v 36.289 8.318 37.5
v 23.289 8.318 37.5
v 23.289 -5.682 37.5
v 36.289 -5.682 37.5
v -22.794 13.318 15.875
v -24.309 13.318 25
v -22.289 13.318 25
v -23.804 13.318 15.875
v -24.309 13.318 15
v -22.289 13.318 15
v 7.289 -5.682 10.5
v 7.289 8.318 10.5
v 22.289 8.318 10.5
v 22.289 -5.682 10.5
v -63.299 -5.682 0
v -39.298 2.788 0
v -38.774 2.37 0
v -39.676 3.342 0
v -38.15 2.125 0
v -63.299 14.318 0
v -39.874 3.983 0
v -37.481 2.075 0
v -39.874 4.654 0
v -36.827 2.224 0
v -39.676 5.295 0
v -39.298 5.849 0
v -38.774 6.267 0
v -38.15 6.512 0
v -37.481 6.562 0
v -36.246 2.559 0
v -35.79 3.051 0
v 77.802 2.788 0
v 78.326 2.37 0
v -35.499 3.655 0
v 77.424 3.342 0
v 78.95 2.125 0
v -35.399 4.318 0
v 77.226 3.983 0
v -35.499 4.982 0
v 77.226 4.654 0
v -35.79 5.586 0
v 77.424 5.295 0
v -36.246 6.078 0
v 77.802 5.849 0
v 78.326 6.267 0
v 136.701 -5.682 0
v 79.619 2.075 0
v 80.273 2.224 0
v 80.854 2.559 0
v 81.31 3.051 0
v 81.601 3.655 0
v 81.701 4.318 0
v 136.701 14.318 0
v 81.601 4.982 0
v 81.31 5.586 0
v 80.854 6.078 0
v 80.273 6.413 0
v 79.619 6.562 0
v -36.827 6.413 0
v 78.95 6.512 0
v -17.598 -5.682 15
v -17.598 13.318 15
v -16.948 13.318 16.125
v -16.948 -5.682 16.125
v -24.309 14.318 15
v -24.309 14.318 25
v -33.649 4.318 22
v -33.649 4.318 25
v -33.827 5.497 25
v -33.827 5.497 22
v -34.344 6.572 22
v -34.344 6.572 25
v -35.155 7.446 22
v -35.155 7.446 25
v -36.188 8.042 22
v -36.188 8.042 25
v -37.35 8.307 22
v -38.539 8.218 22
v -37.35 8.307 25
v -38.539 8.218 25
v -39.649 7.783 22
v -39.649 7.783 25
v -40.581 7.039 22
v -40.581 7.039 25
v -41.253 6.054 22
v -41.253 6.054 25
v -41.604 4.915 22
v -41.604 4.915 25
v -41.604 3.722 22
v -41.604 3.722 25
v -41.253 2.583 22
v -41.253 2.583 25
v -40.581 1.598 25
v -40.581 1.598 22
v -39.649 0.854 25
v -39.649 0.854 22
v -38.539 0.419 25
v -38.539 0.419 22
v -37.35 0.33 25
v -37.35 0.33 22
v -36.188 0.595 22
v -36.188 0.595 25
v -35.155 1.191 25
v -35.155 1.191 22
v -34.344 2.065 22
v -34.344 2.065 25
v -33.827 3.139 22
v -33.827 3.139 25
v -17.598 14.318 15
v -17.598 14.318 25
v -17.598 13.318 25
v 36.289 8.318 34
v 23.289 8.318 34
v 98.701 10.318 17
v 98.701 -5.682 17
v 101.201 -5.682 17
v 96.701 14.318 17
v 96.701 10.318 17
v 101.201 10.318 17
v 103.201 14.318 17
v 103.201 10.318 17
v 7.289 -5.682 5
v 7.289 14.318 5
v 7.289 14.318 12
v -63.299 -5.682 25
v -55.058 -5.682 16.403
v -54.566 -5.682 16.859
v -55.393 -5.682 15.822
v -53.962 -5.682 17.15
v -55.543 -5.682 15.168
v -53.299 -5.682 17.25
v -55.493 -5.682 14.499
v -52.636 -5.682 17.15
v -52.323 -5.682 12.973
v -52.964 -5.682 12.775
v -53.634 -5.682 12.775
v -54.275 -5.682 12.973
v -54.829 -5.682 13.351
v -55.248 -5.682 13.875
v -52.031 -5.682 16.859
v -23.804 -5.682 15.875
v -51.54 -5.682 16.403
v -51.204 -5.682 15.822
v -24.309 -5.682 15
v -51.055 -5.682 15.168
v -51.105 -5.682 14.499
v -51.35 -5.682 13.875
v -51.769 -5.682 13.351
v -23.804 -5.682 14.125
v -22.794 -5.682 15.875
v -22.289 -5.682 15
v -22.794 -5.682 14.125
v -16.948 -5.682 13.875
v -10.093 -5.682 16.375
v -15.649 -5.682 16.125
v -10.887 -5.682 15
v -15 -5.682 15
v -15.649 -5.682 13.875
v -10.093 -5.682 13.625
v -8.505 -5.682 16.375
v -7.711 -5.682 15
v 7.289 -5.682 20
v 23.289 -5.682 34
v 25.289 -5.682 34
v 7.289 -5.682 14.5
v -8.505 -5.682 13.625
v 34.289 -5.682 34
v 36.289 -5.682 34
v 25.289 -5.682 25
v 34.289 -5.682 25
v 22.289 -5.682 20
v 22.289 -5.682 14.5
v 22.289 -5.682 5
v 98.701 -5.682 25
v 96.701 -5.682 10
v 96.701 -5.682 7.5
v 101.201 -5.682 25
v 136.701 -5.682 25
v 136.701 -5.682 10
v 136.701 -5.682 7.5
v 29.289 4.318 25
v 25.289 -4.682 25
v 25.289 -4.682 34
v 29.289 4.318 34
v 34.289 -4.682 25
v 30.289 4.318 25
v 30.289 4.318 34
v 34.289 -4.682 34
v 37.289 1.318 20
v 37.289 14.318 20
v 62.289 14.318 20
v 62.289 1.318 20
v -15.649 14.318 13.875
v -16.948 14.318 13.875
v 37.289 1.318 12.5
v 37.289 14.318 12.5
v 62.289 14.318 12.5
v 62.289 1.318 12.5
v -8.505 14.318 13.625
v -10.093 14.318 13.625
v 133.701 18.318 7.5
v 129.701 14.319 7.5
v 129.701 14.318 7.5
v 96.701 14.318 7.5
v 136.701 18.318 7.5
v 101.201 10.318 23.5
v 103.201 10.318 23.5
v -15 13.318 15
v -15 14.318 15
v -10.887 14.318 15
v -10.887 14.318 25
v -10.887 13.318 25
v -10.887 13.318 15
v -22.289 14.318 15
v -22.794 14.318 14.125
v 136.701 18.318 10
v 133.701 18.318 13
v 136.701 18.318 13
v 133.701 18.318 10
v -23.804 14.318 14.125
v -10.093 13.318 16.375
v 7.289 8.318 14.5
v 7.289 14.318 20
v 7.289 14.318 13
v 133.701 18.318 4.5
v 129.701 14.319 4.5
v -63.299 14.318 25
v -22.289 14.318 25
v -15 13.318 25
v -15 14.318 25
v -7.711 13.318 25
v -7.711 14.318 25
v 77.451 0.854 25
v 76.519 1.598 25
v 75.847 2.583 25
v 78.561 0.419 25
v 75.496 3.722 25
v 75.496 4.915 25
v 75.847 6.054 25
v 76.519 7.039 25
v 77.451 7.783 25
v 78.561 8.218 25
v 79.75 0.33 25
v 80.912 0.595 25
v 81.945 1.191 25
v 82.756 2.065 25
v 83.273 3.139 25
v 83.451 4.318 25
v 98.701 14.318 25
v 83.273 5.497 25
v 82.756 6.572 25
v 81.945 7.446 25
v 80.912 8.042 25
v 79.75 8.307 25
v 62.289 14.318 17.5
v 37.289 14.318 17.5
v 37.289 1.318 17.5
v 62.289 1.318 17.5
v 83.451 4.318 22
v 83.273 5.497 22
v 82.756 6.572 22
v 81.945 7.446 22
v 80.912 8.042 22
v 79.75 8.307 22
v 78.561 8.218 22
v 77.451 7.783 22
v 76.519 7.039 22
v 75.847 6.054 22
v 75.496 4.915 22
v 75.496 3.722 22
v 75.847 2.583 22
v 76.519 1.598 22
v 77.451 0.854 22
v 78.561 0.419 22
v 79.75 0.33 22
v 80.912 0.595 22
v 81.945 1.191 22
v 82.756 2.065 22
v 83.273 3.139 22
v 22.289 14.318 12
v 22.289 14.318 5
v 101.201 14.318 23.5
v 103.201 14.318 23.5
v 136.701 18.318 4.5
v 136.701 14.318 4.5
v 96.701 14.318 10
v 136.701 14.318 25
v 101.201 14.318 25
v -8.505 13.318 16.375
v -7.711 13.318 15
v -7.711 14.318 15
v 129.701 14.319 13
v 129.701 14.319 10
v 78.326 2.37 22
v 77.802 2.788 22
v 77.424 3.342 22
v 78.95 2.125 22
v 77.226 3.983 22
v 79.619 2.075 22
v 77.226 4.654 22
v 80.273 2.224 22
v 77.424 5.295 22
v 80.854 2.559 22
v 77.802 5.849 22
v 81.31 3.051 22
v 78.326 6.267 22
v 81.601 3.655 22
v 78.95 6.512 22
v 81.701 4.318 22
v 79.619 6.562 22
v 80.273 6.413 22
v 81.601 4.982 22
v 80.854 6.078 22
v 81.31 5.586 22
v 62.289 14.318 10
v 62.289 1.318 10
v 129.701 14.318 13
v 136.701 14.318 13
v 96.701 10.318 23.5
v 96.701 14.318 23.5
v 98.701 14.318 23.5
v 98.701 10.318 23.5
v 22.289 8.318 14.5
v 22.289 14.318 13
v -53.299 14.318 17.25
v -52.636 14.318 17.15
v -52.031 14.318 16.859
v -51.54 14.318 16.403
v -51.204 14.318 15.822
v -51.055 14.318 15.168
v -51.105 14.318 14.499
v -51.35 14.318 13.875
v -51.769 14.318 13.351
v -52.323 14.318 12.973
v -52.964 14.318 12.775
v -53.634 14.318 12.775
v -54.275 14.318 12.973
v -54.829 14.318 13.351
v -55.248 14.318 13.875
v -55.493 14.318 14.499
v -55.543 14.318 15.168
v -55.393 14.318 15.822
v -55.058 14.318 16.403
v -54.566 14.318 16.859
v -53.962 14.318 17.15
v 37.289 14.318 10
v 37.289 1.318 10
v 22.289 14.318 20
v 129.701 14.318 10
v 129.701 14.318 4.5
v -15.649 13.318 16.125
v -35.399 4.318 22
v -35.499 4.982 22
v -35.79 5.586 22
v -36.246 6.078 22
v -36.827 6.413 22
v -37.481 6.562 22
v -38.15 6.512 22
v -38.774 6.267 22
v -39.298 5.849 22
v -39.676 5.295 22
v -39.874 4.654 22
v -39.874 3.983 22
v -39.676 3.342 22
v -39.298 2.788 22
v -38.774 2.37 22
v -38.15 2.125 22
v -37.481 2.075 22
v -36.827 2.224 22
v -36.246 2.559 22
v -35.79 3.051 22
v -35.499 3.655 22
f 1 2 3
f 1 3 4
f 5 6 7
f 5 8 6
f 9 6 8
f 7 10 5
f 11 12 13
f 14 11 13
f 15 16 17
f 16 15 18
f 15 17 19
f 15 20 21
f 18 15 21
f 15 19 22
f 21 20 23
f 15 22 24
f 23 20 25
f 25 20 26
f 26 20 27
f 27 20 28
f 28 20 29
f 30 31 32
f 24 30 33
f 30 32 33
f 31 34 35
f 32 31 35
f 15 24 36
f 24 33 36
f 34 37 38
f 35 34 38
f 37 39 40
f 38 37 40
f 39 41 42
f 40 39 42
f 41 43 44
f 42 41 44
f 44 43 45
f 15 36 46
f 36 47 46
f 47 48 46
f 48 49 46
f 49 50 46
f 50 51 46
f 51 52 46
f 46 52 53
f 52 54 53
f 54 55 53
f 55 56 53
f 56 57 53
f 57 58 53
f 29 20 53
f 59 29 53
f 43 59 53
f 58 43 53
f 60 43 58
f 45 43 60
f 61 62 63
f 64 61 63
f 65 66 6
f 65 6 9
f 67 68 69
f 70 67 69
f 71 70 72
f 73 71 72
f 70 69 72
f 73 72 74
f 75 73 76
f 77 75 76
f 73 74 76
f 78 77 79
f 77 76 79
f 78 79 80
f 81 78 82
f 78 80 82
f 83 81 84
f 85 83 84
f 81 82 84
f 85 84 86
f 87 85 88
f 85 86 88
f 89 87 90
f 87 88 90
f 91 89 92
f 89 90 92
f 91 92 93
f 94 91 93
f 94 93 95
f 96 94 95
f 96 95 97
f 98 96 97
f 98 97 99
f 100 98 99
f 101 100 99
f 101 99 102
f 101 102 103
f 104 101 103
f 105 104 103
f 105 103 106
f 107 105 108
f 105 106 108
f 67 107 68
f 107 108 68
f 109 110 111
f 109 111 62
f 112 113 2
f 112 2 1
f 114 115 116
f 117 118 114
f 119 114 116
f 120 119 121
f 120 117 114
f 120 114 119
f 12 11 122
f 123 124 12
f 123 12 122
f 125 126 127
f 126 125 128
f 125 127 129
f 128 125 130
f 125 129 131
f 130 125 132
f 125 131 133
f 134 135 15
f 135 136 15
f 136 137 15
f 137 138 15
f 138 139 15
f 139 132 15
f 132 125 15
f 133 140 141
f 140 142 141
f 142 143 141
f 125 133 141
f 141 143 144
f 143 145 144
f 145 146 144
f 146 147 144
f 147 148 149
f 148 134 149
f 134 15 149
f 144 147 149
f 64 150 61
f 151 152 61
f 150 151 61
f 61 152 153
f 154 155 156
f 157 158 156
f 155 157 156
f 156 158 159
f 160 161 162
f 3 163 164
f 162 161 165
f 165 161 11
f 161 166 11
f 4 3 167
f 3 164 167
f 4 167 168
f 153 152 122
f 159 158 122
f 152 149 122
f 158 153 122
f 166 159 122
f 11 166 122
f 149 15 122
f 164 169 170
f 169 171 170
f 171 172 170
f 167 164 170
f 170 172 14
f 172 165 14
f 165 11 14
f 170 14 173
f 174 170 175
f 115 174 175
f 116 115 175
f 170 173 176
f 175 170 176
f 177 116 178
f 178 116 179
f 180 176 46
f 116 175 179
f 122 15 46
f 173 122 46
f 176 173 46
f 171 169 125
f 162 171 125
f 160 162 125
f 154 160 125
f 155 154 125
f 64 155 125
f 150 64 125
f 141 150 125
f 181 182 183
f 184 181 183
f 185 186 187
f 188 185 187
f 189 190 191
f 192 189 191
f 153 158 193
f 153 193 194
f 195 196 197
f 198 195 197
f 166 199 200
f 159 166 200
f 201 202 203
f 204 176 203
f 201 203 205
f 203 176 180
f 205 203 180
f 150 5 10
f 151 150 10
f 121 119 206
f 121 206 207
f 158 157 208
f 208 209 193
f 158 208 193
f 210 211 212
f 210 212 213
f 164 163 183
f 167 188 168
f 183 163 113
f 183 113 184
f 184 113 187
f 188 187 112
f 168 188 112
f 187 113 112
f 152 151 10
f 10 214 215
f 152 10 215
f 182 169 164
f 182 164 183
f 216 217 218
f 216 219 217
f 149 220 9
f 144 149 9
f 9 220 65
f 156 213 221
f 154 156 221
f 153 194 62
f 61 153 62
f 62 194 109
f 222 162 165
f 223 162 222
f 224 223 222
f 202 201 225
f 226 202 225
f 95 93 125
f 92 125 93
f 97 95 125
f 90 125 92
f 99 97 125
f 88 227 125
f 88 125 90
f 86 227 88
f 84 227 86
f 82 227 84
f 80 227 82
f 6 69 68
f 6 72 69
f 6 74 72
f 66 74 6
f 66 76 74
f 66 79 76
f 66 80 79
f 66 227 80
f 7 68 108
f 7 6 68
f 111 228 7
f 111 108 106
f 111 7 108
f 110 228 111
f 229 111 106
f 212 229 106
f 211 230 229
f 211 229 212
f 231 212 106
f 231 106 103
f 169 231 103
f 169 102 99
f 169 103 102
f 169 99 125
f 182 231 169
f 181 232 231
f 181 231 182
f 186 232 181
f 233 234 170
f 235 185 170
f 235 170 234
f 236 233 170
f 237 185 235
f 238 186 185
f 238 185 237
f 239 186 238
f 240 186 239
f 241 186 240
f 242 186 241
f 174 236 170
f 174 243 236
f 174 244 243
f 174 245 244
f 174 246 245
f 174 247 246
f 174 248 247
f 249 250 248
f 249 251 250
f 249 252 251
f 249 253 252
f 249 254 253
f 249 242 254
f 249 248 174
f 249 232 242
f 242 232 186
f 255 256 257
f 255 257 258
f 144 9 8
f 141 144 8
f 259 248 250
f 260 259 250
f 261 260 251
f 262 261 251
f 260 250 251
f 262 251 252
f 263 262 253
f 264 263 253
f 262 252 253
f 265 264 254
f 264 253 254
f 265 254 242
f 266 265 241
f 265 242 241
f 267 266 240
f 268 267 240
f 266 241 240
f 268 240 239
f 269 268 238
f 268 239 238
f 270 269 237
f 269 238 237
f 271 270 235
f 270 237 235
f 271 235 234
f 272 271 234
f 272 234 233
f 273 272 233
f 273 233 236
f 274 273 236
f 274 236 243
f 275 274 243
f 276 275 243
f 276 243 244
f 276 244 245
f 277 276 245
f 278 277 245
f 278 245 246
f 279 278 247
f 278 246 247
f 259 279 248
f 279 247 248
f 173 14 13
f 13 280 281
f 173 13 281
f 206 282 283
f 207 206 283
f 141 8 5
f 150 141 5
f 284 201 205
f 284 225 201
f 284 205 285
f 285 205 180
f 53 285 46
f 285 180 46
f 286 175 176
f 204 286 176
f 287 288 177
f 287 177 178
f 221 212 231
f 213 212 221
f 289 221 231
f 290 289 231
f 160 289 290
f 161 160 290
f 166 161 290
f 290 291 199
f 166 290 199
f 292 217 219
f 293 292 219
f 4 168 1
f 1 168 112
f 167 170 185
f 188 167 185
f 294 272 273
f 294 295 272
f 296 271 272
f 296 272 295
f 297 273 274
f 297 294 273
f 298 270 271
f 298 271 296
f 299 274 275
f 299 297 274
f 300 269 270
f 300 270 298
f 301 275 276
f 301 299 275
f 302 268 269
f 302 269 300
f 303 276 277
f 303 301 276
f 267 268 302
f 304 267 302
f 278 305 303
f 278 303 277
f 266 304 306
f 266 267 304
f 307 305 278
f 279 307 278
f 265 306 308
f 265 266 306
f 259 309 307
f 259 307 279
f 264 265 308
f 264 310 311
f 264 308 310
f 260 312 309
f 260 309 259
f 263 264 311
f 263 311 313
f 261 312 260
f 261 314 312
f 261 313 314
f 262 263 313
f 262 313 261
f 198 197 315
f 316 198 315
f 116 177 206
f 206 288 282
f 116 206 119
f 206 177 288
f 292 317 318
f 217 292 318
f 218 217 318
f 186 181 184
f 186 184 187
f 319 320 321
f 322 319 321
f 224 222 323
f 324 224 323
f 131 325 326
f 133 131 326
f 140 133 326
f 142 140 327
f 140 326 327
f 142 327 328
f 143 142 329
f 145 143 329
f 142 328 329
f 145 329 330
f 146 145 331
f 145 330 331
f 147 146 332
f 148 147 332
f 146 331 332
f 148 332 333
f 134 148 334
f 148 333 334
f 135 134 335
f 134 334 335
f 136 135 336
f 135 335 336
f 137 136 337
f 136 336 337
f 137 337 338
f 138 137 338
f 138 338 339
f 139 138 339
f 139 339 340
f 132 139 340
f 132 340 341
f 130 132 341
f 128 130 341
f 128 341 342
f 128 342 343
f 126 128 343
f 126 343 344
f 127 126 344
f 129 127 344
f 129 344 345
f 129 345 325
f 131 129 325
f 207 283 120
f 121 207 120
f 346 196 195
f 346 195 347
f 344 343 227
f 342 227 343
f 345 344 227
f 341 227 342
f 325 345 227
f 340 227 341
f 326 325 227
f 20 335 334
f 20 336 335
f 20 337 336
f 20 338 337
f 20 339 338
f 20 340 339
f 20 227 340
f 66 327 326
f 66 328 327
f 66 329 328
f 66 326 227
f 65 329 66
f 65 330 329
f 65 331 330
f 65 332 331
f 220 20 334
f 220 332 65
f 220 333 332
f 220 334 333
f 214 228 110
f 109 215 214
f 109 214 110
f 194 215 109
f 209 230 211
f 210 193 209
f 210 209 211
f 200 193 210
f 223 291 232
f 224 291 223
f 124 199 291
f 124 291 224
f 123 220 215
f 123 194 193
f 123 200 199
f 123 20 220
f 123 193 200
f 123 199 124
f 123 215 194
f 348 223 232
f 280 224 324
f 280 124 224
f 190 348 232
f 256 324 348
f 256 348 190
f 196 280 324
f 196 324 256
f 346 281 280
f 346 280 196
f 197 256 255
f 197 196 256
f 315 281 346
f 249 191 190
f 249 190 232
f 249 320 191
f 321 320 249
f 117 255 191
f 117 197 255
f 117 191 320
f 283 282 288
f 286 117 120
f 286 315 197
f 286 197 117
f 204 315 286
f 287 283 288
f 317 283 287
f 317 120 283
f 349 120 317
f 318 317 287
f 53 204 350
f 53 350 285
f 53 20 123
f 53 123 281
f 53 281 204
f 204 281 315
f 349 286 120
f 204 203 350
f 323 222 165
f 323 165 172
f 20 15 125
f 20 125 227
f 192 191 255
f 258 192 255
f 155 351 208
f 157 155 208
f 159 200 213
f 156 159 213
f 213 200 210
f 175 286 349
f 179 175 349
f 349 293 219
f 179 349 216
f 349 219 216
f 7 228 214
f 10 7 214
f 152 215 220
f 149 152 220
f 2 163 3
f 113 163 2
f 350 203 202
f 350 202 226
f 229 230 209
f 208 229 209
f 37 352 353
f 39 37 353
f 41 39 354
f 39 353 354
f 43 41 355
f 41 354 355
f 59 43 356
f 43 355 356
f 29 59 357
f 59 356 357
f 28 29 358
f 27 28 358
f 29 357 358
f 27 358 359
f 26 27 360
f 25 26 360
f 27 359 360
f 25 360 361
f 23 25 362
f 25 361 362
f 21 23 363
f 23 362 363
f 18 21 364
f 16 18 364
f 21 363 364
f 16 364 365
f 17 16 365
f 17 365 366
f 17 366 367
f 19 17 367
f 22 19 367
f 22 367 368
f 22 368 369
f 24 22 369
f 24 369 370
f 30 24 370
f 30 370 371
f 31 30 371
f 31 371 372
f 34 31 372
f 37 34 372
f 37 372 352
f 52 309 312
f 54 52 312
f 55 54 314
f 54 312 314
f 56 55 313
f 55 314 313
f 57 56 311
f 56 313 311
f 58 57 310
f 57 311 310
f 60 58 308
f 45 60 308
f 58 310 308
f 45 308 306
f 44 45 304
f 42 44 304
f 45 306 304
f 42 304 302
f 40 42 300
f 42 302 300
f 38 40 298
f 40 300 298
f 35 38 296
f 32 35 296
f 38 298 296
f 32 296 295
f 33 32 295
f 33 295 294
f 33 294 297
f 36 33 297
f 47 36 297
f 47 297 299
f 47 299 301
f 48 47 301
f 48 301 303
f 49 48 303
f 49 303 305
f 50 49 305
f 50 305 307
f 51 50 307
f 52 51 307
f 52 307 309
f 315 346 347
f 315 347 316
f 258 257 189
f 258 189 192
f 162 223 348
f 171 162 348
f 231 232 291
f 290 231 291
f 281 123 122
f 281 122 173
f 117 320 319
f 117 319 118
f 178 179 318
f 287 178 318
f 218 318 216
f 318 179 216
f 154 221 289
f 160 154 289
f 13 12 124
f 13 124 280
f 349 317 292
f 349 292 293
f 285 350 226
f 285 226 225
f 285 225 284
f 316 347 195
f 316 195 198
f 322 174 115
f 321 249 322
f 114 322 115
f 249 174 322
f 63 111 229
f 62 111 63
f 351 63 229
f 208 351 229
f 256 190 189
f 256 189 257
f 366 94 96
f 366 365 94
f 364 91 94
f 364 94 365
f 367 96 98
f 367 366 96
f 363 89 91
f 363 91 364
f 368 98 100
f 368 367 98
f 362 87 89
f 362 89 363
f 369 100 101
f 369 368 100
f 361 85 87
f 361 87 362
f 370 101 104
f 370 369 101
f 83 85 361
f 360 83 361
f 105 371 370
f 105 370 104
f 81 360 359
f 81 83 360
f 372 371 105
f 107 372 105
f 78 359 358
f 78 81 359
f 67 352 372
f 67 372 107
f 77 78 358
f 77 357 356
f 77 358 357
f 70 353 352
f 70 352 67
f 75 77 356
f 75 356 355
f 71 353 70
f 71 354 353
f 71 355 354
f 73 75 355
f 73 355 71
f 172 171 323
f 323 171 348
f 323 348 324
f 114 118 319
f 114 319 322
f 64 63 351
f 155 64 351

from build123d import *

# Parameters (mm, degrees)
SCHIZZO1_W                    = 200
SCHIZZO1_H                    = 20
ESTRUSIONE_ESTRUSIONE1_DEPTH  = 25
SCHIZZO2_R                    = 2.25
TAGLIO_ESTRUSIONE1_DEPTH      = 141.400046302
SCHIZZO4_W                    = 2.020725942
SCHIZZO4_H                    = 10
SCHIZZO4_W_2                  = 2.598076211
SCHIZZO4_W_3                  = 3.175426481
TAGLIO_ESTRUSIONE2_DEPTH      = 1
SCHIZZO7_W                    = 15
SCHIZZO7_H                    = 5.5
TAGLIO_ESTRUSIONE3_DEPTH      = 141.400046302
SMUSSO1_SIZE                  = 1.5
SMUSSO1_SIZE2                 = 6
SCHIZZO8_W                    = 25
SCHIZZO8_H                    = 2.5
TAGLIO_ESTRUSIONE4_DEPTH      = 13
SCHIZZO9_W                    = 40
SCHIZZO9_H                    = 2.5
TAGLIO_ESTRUSIONE5_DEPTH      = 141.400046302
SCHIZZO10_W                   = 7
SCHIZZO10_H                   = 3
ESTRUSIONE_ESTRUSIONE5_DEPTH  = 4
SMUSSO2_SIZE                  = 4
SCHIZZO11_W                   = 2.5
SCHIZZO11_H                   = 8
TAGLIO_ESTRUSIONE6_DEPTH      = 141.400046302
SCHIZZO12_W                   = 6.5
SCHIZZO12_H                   = 6.5
TAGLIO_ESTRUSIONE7_DEPTH      = 4
SCHIZZO13_W                   = 9
SCHIZZO13_H                   = 10
ESTRUSIONE_ESTRUSIONE9_DEPTH  = 9
SCHIZZO14_W                   = 13
SCHIZZO14_H                   = 14
ESTRUSIONE_ESTRUSIONE10_DEPTH = 3.5
SMUSSO3_SIZE                  = 9
SMUSSO3_SIZE2                 = 4
SMUSSO4_SIZE                  = 4
SMUSSO4_SIZE2                 = 9
SCHIZZO16_R                   = 2.25
TAGLIO_ESTRUSIONE8_DEPTH      = 141.17038757
SCHIZZO17_R                   = 4
TAGLIO_ESTRUSIONE9_DEPTH      = 3


with BuildPart() as part:
    # Schizzo1 → Estrusione-Estrusione1 (new body)
    with BuildSketch(Plane.XY):
        with Locations((36.701035116, 4.318421053)):
            Rectangle(SCHIZZO1_W, SCHIZZO1_H)
    extrude(amount=ESTRUSIONE_ESTRUSIONE1_DEPTH)

    # Schizzo2 → Taglio-Estrusione1 (cut, through all)
    with BuildSketch(Plane(origin=(0, 14.318421053, 0), x_dir=(1, 0, 0), z_dir=(0, 1, 0))):
        with Locations(Location((-53.298964884, -15, 0), (0, 0, 270))):
            Circle(SCHIZZO2_R)
        Polygon((-23.80414637, -15.875), (-22.793783399, -15.875), (-22.288601913, -15), (-22.793783399, -14.125), (-23.80414637, -14.125), (-24.309327855, -15), align=None)
        Polygon((-14.999926779, -15), (-15.649445831, -13.875), (-16.948483937, -13.875), (-17.59800299, -15), (-16.948483937, -16.125), (-15.649445831, -16.125), align=None)
        Polygon((-8.505108264, -16.375), (-7.711251644, -15), (-8.505108264, -13.625), (-10.092821504, -13.625), (-10.886678125, -15), (-10.092821504, -16.375), align=None)
    extrude(amount=-TAGLIO_ESTRUSIONE1_DEPTH, mode=Mode.SUBTRACT)

    # Schizzo4 → Taglio-Estrusione2 (cut)
    with BuildSketch(Plane(origin=(0, 14.318421053, 0), x_dir=(1, 0, 0), z_dir=(0, 1, 0))):
        with Locations((-23.298964884, -20)):
            Rectangle(SCHIZZO4_W, SCHIZZO4_H)
        with Locations((-16.298964885, -20)):
            Rectangle(SCHIZZO4_W_2, SCHIZZO4_H)
        with Locations((-9.298964885, -20)):
            Rectangle(SCHIZZO4_W_3, SCHIZZO4_H)
    extrude(amount=-TAGLIO_ESTRUSIONE2_DEPTH, mode=Mode.SUBTRACT)

    # Schizzo7 → Taglio-Estrusione3 (cut, through all)
    with BuildSketch(Plane(origin=(0, 14.318421053, 0), x_dir=(1, 0, 0), z_dir=(0, 1, 0))):
        with Locations((14.788748356, -17.25)):
            Rectangle(SCHIZZO7_W, SCHIZZO7_H)
        with Locations((14.788748356, -7.75)):
            Rectangle(SCHIZZO7_W, SCHIZZO7_H)
    extrude(amount=-TAGLIO_ESTRUSIONE3_DEPTH, mode=Mode.SUBTRACT)

    # Smusso1
    smusso1_edges = [part.edges().sort_by_distance(p)[0] for p in [
        (14.788748356, 14.318421053, 14.5),
        (14.788748356, 14.318421053, 10.5),
    ]]
    smusso1_side = [part.faces().sort_by_distance(p)[0] for p in [
        (38.695689024, 14.318421053, 12.36530447),
    ]]
    chamfer(smusso1_edges, length=SMUSSO1_SIZE, length2=SMUSSO1_SIZE2, reference=smusso1_side[0])

    # Schizzo8 → Taglio-Estrusione4 (cut)
    with BuildSketch(Plane(origin=(0, 14.318421053, 0), x_dir=(1, 0, 0), z_dir=(0, 1, 0))):
        with Locations((49.788748356, -18.75)):
            Rectangle(SCHIZZO8_W, SCHIZZO8_H)
        with Locations((49.788748356, -11.25)):
            Rectangle(SCHIZZO8_W, SCHIZZO8_H)
    extrude(amount=-TAGLIO_ESTRUSIONE4_DEPTH, mode=Mode.SUBTRACT)

    # Schizzo9 → Taglio-Estrusione5 (cut, through all)
    with BuildSketch(Plane(origin=(0, 14.318421053, 0), x_dir=(1, 0, 0), z_dir=(0, 1, 0))):
        with Locations((116.701035116, -8.75)):
            Rectangle(SCHIZZO9_W, SCHIZZO9_H)
    extrude(amount=-TAGLIO_ESTRUSIONE5_DEPTH, mode=Mode.SUBTRACT)

    # Schizzo10 → Estrusione-Estrusione5 (add)
    with BuildSketch(Plane(origin=(0, 14.318421053, 0), x_dir=(1, 0, 0), z_dir=(0, 1, 0))):
        with Locations((133.201035116, -6)):
            Rectangle(SCHIZZO10_W, SCHIZZO10_H)
        with Locations((133.201035116, -11.5)):
            Rectangle(SCHIZZO10_W, SCHIZZO10_H)
    extrude(amount=ESTRUSIONE_ESTRUSIONE5_DEPTH)

    # Smusso2
    smusso2_edges = [part.edges().sort_by_distance(p)[0] for p in [
        (129.701035116, 18.318421053, 11.5),
        (129.701035116, 18.318421053, 6),
    ]]
    chamfer(smusso2_edges, length=SMUSSO2_SIZE - 0.0001)  # a hair under: the kernel refuses the full size

    # Schizzo11 → Taglio-Estrusione6 (cut, through all)
    with BuildSketch(Plane(origin=(0, 14.318421053, 0), x_dir=(1, 0, 0), z_dir=(0, 1, 0))):
        with Locations((99.951035116, -21)):
            Rectangle(SCHIZZO11_W, SCHIZZO11_H)
    extrude(amount=-TAGLIO_ESTRUSIONE6_DEPTH, mode=Mode.SUBTRACT)

    # Schizzo12 → Taglio-Estrusione7 (cut)
    with BuildSketch(Plane(origin=(0, 14.318421053, 0), x_dir=(1, 0, 0), z_dir=(0, 1, 0))):
        with Locations((99.951035116, -20.25)):
            Rectangle(SCHIZZO12_W, SCHIZZO12_H)
    extrude(amount=-TAGLIO_ESTRUSIONE7_DEPTH, mode=Mode.SUBTRACT)

    # Schizzo13 → Estrusione-Estrusione9 (add)
    with BuildSketch(Plane.XY.offset(25)):
        with Locations((29.788748356, -0.681578947)):
            Rectangle(SCHIZZO13_W, SCHIZZO13_H)
    extrude(amount=ESTRUSIONE_ESTRUSIONE9_DEPTH)

    # Schizzo14 → Estrusione-Estrusione10 (add)
    with BuildSketch(Plane.XY.offset(34)):
        with Locations((29.788748356, 1.318421053)):
            Rectangle(SCHIZZO14_W, SCHIZZO14_H)
    extrude(amount=ESTRUSIONE_ESTRUSIONE10_DEPTH)

    # Smusso3
    smusso3_edges = [part.edges().sort_by_distance(p)[0] for p in [
        (34.288748356, 4.318421053, 29.5),
    ]]
    smusso3_side = [part.faces().sort_by_distance(p)[0] for p in [
        (34.288748356, -0.681578947, 29.5),
    ]]
    chamfer(smusso3_edges, length=SMUSSO3_SIZE, length2=SMUSSO3_SIZE2, reference=smusso3_side[0])

    # Smusso4
    smusso4_edges = [part.edges().sort_by_distance(p)[0] for p in [
        (25.288748356, 4.318421053, 29.5),
    ]]
    smusso4_side = [part.faces().sort_by_distance(p)[0] for p in [
        (27.788748356, 4.318421053, 29.5),
    ]]
    chamfer(smusso4_edges, length=SMUSSO4_SIZE, length2=SMUSSO4_SIZE2, reference=smusso4_side[0])

    # Schizzo16 → Taglio-Estrusione8 (cut, through all)
    with BuildSketch(Plane.XY.offset(25)):
        with Locations((-37.648964884, 4.318421053)):
            Circle(SCHIZZO16_R)
        with Locations((79.451035116, 4.318421053)):
            Circle(SCHIZZO16_R)
    extrude(amount=-TAGLIO_ESTRUSIONE8_DEPTH, mode=Mode.SUBTRACT)

    # Schizzo17 → Taglio-Estrusione9 (cut)
    with BuildSketch(Plane.XY.offset(25)):
        with Locations((-37.648964884, 4.318421053)):
            Circle(SCHIZZO17_R)
        with Locations((79.451035116, 4.318421053)):
            Circle(SCHIZZO17_R)
    extrude(amount=-TAGLIO_ESTRUSIONE9_DEPTH, mode=Mode.SUBTRACT)


solid = part.part
